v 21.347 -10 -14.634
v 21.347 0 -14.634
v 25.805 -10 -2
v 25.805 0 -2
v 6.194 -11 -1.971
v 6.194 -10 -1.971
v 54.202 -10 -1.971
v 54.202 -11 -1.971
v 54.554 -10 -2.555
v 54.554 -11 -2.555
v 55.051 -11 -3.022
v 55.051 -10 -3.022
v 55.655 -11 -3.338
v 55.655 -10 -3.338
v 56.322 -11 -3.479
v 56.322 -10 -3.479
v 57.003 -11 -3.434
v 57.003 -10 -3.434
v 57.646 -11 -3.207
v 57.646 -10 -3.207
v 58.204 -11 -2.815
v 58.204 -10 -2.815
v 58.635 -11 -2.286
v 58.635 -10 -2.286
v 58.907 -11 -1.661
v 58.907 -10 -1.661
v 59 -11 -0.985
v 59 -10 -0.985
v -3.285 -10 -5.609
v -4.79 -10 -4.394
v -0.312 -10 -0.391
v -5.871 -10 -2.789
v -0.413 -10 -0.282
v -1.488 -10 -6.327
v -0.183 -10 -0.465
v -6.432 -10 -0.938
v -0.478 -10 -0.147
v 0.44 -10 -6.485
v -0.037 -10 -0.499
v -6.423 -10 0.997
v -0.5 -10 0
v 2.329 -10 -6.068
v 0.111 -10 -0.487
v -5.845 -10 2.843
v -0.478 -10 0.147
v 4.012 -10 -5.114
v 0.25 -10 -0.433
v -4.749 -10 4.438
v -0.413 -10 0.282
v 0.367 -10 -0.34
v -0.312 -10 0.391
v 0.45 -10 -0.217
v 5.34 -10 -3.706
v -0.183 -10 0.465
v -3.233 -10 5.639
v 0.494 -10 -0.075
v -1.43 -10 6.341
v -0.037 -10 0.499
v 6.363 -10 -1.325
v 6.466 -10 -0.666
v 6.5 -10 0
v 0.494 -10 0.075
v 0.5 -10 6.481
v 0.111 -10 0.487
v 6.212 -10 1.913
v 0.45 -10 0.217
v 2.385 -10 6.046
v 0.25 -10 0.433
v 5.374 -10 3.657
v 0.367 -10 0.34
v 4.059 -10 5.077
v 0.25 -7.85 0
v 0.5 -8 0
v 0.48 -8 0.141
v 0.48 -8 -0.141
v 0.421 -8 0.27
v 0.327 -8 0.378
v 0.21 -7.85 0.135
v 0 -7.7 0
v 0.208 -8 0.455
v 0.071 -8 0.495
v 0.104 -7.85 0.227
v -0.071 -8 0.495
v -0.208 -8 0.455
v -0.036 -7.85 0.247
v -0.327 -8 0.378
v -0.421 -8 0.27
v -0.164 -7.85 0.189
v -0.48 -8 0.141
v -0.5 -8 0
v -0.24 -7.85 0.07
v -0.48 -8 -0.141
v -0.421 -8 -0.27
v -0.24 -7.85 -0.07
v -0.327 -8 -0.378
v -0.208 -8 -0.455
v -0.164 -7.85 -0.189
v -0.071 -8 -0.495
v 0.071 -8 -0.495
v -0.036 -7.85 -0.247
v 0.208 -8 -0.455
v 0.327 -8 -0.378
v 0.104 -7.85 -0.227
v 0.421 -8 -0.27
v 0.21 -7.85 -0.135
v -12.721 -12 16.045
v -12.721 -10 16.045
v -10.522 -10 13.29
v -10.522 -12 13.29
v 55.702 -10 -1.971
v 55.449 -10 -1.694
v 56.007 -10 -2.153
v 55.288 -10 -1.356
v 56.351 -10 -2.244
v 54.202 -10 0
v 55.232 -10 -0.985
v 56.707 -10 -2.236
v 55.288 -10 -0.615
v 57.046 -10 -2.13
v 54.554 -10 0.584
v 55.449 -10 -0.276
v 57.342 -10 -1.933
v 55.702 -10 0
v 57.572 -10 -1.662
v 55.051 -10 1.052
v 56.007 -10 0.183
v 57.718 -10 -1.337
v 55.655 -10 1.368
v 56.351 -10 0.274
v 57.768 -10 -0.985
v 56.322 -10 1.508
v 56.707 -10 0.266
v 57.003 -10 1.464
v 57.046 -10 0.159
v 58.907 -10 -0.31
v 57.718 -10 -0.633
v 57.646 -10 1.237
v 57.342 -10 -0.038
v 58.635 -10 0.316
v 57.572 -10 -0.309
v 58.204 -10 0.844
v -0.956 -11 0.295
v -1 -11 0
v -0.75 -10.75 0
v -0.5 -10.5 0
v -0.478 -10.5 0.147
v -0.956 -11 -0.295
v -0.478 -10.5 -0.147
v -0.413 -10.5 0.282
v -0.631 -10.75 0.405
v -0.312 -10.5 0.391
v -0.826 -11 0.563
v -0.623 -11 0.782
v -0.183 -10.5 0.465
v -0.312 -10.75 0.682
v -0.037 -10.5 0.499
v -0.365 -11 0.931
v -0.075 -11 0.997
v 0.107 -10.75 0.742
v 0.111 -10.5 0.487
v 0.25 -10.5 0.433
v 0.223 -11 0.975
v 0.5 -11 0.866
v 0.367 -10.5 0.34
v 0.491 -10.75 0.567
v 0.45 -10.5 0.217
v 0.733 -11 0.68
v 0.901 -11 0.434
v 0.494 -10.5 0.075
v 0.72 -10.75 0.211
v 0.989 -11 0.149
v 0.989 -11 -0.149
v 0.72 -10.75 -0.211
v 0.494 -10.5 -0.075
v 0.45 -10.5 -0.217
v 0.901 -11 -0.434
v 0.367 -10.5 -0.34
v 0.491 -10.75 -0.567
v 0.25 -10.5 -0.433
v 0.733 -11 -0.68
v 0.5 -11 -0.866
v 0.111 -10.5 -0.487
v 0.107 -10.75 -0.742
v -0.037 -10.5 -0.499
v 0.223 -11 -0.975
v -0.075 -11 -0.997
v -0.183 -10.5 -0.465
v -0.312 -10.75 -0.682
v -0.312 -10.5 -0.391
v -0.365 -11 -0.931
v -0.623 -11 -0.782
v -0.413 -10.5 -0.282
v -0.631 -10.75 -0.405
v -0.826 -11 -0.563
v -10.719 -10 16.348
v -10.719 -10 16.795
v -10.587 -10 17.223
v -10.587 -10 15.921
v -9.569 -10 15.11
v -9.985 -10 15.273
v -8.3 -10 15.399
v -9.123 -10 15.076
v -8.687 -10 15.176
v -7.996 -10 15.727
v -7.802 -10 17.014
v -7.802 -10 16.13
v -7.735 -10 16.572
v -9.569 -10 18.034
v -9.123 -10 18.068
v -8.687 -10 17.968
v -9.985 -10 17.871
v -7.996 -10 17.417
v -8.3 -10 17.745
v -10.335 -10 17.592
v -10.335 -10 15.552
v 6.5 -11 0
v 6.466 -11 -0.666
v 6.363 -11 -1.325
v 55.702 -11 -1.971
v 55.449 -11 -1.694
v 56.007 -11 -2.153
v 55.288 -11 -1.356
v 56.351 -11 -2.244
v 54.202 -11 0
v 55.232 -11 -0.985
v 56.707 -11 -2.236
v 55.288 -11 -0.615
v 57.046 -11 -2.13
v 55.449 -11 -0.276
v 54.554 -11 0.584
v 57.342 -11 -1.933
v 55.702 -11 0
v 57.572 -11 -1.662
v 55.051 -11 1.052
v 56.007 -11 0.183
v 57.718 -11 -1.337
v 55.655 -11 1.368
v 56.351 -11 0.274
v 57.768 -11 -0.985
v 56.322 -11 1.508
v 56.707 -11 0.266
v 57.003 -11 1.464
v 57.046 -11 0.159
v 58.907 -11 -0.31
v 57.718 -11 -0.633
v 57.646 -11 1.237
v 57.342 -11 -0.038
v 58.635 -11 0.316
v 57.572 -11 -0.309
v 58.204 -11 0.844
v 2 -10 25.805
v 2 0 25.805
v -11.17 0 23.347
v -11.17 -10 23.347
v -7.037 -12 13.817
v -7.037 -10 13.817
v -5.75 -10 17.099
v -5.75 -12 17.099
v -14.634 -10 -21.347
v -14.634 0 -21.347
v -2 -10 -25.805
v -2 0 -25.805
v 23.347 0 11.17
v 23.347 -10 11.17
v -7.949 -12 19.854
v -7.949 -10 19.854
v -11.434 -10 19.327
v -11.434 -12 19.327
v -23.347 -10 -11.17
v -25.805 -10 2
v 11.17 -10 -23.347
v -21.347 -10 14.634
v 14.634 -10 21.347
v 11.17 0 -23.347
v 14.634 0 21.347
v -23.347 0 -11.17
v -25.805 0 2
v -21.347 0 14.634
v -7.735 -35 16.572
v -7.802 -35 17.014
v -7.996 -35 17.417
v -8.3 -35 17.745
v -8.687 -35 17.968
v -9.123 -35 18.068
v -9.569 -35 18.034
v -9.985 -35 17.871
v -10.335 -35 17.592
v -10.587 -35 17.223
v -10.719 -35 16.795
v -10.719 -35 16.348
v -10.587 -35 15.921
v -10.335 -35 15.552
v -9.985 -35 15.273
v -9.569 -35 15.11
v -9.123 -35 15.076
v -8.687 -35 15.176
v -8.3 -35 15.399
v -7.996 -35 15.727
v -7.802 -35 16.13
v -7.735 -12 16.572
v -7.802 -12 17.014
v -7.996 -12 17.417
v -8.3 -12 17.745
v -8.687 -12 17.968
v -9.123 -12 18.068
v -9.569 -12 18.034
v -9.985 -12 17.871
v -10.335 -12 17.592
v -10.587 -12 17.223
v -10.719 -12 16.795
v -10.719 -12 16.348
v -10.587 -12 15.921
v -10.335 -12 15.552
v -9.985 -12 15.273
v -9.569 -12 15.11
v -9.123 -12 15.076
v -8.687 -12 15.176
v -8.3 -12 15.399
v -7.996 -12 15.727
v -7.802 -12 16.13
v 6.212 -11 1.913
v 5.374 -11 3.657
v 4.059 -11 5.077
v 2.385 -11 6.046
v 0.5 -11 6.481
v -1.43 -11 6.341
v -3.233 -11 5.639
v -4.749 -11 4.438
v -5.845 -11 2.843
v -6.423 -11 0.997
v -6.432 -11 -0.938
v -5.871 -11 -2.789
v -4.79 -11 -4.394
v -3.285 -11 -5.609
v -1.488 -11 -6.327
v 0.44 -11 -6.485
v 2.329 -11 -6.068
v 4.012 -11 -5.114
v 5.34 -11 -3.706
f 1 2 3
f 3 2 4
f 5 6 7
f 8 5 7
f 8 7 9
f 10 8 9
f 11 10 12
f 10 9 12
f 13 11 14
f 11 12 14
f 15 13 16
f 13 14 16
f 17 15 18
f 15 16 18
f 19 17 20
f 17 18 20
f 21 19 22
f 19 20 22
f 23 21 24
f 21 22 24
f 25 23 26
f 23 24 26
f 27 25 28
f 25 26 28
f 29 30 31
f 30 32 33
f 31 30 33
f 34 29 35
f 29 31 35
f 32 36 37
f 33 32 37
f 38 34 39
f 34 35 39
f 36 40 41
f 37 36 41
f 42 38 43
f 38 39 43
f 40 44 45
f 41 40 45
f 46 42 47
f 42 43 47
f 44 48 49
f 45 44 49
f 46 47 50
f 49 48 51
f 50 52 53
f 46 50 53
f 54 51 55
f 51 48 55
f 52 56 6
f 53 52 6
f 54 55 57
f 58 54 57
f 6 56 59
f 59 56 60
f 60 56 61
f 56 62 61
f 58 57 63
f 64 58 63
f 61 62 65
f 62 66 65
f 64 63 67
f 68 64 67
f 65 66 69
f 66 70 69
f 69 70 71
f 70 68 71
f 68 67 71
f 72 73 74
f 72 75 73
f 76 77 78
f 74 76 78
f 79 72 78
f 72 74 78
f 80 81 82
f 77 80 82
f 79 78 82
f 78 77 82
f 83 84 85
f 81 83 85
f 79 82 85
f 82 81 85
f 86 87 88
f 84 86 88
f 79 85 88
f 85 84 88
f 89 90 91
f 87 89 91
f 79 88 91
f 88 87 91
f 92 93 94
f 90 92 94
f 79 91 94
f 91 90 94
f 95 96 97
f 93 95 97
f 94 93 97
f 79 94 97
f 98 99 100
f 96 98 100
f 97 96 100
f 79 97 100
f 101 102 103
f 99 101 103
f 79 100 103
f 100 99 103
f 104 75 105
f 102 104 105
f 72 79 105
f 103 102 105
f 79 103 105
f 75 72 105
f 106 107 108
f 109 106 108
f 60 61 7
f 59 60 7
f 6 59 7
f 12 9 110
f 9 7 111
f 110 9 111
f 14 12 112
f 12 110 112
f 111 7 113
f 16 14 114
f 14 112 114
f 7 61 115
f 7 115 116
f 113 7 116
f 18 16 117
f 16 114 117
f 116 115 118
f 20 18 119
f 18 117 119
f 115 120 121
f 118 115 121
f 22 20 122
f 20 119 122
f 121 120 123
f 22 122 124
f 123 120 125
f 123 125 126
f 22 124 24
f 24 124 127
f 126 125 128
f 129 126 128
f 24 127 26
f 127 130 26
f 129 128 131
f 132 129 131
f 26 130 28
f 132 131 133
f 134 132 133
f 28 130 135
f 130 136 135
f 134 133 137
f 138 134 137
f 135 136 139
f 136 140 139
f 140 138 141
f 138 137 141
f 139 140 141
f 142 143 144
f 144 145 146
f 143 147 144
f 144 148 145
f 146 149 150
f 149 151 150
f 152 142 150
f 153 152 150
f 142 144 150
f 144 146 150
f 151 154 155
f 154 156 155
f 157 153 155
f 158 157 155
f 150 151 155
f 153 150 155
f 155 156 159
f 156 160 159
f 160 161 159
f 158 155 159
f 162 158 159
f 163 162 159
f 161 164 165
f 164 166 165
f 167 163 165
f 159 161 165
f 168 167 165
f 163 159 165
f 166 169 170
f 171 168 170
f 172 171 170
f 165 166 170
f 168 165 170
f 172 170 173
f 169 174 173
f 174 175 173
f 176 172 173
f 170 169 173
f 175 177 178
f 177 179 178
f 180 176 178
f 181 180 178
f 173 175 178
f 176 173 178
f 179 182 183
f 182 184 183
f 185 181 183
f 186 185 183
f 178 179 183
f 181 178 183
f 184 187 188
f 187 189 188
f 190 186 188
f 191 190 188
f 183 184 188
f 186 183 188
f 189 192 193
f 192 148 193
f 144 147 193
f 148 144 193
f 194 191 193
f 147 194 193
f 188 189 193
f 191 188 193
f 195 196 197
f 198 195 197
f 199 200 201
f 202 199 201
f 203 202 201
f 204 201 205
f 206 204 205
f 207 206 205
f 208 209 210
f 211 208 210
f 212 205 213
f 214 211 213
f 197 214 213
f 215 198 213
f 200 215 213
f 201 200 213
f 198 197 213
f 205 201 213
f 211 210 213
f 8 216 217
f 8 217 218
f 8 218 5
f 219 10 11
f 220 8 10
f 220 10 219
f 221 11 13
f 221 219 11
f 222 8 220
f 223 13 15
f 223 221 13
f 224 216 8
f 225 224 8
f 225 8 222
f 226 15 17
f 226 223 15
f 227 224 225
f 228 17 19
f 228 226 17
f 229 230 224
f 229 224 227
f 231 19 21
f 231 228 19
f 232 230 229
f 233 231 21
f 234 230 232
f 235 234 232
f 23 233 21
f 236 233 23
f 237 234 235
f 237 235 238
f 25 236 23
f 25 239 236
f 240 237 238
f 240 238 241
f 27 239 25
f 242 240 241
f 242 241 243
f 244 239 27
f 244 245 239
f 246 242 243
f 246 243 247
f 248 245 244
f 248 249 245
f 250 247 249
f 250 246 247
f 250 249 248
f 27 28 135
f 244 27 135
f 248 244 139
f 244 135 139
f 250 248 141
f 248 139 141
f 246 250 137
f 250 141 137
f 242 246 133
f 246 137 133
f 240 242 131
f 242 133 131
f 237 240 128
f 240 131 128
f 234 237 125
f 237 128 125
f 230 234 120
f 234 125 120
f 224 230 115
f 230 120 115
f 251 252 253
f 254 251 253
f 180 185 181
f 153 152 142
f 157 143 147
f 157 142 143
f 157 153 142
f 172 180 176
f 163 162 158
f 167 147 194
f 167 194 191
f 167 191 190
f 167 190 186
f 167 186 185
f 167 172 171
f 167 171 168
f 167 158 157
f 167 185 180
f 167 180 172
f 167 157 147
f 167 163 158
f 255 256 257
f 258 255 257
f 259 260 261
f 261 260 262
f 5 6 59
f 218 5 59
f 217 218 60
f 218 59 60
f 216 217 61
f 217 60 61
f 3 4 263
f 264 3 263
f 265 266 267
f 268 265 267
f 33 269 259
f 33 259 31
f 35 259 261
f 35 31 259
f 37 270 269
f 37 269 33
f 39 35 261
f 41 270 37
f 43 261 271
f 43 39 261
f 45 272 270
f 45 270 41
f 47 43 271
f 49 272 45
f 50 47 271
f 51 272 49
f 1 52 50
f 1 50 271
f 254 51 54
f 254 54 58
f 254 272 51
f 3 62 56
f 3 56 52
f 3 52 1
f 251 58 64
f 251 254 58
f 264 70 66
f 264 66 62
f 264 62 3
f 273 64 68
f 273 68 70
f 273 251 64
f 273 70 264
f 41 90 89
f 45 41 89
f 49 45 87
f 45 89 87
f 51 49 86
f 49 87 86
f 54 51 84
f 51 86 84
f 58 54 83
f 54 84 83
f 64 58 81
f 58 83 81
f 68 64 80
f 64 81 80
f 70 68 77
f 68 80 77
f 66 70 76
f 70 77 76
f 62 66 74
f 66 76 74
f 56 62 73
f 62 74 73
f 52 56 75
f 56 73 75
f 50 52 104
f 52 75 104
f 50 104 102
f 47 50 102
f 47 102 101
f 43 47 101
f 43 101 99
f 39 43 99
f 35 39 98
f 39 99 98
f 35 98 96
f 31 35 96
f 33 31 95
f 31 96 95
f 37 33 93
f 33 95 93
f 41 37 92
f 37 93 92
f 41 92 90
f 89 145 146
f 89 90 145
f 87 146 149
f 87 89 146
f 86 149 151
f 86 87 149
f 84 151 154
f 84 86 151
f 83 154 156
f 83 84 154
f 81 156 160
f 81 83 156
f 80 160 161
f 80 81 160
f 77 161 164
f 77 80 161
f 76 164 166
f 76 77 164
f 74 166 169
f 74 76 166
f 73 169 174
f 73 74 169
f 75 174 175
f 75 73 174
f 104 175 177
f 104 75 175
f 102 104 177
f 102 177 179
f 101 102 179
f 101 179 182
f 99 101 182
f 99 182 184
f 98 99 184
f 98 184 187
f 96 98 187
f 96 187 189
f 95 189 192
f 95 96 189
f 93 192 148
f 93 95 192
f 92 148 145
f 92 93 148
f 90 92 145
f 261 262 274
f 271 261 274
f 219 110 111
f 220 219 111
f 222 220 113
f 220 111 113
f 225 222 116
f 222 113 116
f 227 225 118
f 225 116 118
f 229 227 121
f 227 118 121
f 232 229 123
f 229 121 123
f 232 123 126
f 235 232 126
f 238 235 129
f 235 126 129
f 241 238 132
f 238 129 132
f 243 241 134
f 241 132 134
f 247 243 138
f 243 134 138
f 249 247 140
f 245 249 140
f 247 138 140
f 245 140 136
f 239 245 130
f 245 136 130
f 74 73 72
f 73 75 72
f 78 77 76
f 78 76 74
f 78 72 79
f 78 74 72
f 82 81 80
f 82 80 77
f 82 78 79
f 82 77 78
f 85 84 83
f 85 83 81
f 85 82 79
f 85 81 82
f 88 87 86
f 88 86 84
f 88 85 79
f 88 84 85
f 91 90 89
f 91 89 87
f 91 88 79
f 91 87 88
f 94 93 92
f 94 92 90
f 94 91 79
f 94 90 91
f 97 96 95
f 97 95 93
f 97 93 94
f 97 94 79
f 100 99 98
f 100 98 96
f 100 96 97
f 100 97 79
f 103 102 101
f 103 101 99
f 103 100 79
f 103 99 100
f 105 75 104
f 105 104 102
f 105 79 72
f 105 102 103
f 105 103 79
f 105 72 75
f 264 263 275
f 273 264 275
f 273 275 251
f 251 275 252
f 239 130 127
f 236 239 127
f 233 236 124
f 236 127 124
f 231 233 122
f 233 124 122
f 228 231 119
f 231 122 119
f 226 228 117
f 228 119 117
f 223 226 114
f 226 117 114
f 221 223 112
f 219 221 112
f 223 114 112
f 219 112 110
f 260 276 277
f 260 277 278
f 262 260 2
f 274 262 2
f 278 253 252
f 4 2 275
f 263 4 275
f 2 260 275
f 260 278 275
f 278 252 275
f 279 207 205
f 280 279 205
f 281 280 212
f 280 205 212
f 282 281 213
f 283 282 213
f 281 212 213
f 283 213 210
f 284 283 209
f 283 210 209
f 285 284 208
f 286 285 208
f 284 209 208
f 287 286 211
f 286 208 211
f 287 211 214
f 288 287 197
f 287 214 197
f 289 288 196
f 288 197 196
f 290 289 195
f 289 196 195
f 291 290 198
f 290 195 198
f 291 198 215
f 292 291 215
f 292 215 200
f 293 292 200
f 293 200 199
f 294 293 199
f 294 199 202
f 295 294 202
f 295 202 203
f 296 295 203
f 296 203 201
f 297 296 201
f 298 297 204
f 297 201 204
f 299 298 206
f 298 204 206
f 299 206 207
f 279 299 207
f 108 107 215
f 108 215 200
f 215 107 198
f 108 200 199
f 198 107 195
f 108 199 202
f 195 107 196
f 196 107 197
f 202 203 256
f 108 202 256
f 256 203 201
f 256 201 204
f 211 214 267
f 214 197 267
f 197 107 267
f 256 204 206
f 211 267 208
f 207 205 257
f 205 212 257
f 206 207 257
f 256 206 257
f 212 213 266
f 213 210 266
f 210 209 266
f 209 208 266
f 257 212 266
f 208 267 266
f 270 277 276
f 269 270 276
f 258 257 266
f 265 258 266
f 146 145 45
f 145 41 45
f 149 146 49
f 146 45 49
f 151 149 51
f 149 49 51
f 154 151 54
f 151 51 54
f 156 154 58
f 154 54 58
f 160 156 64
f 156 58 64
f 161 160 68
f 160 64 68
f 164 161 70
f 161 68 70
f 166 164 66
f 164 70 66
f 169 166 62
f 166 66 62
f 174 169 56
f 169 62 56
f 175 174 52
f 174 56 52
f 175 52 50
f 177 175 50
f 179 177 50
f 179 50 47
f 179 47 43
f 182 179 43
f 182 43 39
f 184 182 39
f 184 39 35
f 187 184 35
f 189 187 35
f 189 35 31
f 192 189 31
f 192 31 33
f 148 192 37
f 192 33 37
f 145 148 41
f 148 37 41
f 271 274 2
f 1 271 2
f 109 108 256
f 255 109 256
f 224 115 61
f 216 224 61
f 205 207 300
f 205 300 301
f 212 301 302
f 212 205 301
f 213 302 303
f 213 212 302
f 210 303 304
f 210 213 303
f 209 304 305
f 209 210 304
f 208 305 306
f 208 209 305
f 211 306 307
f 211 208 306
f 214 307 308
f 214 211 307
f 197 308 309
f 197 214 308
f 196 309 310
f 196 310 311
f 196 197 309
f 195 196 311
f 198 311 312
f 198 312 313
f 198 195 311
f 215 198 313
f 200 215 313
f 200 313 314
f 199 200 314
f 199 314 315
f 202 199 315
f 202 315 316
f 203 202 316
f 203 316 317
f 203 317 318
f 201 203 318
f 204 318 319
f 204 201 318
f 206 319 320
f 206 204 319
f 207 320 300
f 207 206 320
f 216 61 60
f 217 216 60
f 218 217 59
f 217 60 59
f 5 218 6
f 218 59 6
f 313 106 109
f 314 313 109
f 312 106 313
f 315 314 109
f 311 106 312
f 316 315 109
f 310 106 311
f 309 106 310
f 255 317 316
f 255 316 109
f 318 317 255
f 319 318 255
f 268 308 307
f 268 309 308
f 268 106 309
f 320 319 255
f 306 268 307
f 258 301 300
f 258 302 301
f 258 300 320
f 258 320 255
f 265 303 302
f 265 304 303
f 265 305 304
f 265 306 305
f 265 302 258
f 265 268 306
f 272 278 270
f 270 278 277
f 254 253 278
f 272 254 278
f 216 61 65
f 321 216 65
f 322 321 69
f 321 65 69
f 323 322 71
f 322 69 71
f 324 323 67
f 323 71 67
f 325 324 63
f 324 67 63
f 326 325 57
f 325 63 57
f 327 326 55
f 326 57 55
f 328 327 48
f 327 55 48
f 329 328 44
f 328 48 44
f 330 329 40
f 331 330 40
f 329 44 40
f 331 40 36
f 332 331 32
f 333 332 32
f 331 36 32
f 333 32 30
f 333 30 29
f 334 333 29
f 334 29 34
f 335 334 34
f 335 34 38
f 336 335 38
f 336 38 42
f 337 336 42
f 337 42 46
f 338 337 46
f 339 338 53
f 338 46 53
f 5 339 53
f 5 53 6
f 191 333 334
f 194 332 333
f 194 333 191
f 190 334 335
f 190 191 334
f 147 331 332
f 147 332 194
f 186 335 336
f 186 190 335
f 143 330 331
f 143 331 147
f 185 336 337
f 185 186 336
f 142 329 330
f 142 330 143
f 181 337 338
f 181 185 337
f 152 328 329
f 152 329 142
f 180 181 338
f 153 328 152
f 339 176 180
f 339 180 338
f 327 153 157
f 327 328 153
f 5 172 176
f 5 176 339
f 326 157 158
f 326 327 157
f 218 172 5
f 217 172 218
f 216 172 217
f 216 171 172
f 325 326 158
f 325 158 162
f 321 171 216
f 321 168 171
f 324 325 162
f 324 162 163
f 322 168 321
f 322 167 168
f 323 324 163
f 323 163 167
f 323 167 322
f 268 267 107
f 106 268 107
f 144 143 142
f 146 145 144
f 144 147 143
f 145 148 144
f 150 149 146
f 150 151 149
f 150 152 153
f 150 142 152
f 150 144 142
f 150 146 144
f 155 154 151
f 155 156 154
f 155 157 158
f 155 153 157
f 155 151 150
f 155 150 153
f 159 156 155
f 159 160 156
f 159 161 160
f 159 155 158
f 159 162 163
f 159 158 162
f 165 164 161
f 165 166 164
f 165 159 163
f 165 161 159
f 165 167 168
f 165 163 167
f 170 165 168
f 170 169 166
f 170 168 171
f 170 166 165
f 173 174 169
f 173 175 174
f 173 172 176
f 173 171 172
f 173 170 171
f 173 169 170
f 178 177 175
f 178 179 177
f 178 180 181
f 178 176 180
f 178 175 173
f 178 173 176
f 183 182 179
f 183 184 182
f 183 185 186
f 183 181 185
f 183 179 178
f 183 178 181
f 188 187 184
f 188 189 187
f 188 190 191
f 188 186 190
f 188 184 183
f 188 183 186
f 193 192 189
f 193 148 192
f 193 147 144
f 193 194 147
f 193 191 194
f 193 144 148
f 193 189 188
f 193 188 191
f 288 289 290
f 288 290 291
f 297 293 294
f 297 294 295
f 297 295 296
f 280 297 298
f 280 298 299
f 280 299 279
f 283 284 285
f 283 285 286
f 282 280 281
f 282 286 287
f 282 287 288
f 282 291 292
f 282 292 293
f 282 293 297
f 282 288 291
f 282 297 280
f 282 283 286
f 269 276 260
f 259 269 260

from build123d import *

# Parameters (mm, degrees)
F1_DEPTH         = 10
F3_DEPTH         = 1
F4_DEPTH         = 1
F6_D             = 1
F6_DEPTH         = 3
F6_CSINK_D       = 2
F6_CSINK_ANGLE   = 90
F6_TIP           = 0.3004303095
F6_2_D           = 1
F6_2_DEPTH       = 3
F6_2_CSINK_D     = 2
F6_2_CSINK_ANGLE = 90
F6_2_TIP         = 0.3004303095
F7_R             = 1
F8_DEPTH         = 11
F10_R            = 1.5
F11_DEPTH        = 25
F12_DEPTH        = 2


with BuildPart() as f1:
    # F0 (on Front) → F1 (new body)
    with BuildSketch(Plane.XZ):
        Polygon((-11.1702065635, 23.347365299), (-21.347365299, 14.6343081786), (-25.8045147421, 2), (-23.347365299, -11.1702065635), (-14.6343081786, -21.347365299), (-2, -25.8045147421), (11.1702065635, -23.347365299), (21.347365299, -14.6343081786), (25.8045147421, -2), (23.347365299, 11.1702065635), (14.6343081786, 21.347365299), (2, 25.8045147421), align=None)
    extrude(amount=F1_DEPTH)

    # F6
    with Locations(Plane.XZ.offset(11)):
        with Locations((0, 0)):
            CounterSinkHole(F6_D / 2, F6_CSINK_D / 2, depth=F6_DEPTH, counter_sink_angle=F6_CSINK_ANGLE)
            with Locations((0, 0, -(F6_DEPTH + F6_TIP / 2))):  # 118° drill point
                Cone(0, F6_D / 2, F6_TIP, mode=Mode.SUBTRACT)


with BuildPart() as f3:
    # F2 (on face) → F3 (new body)
    with BuildSketch(Plane.XZ.offset(10)):
        with BuildLine():
            ThreePointArc((6.1940788733, -1.9706310946), (6.423064404, -0.9971176769), (6.5, 0))
            ThreePointArc((6.5, 0), (-6.423064404, 0.9971176769), (6.1940788733, -1.9706310946))
        make_face()
    extrude(amount=F3_DEPTH)

    # F6#2
    with Locations(Plane.XZ.offset(11)):
        with Locations((0, 0)):
            CounterSinkHole(F6_2_D / 2, F6_2_CSINK_D / 2, depth=F6_2_DEPTH, counter_sink_angle=F6_2_CSINK_ANGLE)
            with Locations((0, 0, -(F6_2_DEPTH + F6_2_TIP / 2))):  # 118° drill point
                Cone(0, F6_2_D / 2, F6_2_TIP, mode=Mode.SUBTRACT)


with BuildPart() as f4:
    # F2 (on face) → F4 (new body)
    with BuildSketch(Plane.XZ.offset(10)):
        with BuildLine():
            Line((25.4313771712, 0), (6.5, 0))
            ThreePointArc((6.5, 0), (6.423064404, -0.9971176769), (6.1940788733, -1.9706310946))
            Line((6.1940788733, -1.9706310946), (25.7990354211, -1.9706310946))
            Line((25.7990354211, -1.9706310946), (25.4313771712, 0))
        make_face()
        with BuildLine():
            Line((54.2023591942, 0), (25.4313771712, 0))
            Line((25.4313771712, 0), (25.7990354211, -1.9706310946))
            Line((25.7990354211, -1.9706310946), (54.2023591942, -1.9706310946))
            ThreePointArc((54.2023591942, -1.9706310946), (54, -0.9853155473), (54.2023591942, 0))
        make_face()
        with BuildLine():
            ThreePointArc((59, -0.9853155473), (57.0029403472, 1.4635721609), (54.2023591942, 0))
            Line((54.2023591942, 0), (55.7021531952, 0))
            ThreePointArc((55.7021531952, 0), (57.0458332799, 0.1590062091), (57.767835262, -0.9853155473))
            ThreePointArc((57.767835262, -0.9853155473), (57.0458332799, -2.1296373037), (55.7021531952, -1.9706310946))
            Line((55.7021531952, -1.9706310946), (54.2023591942, -1.9706310946))
            ThreePointArc((54.2023591942, -1.9706310946), (57.0029403472, -3.4342032554), (59, -0.9853155473))
        make_face()
        with BuildLine():
            Line((55.7021531952, 0), (54.2023591942, 0))
            ThreePointArc((54.2023591942, 0), (54, -0.9853155473), (54.2023591942, -1.9706310946))
            Line((54.2023591942, -1.9706310946), (55.7021531952, -1.9706310946))
            ThreePointArc((55.7021531952, -1.9706310946), (55.232164738, -0.9853155473), (55.7021531952, 0))
        make_face()
    extrude(amount=F4_DEPTH)


with BuildPart() as f8:
    # F7 (on face) → F8 (new body, through all)
    with BuildSketch(Plane.XZ.offset(11)):
        Circle(F7_R)
    extrude(amount=-F8_DEPTH)

    # F9: cut F1, F3
    add(f1.part, mode=Mode.SUBTRACT)
    add(f3.part, mode=Mode.SUBTRACT)


with BuildPart() as f11:
    # F10 (on face) → F11 (new body)
    with BuildSketch(Plane.XZ.offset(10)):
        with Locations((-9.2354677618, 16.5719036013)):
            Circle(F10_R)
    extrude(amount=F11_DEPTH)


with BuildPart() as f12:
    # F10 (on face) → F12 (new body)
    with BuildSketch(Plane.XZ.offset(10)):
        Polygon((-7.0366399973, 13.8169999636), (-5.7502373443, 17.098692485), (-7.9490651088, 19.8535961227), (-11.4342955262, 19.326807239), (-12.7206981792, 16.0451147176), (-10.5218704147, 13.2902110799), align=None)
        with Locations((-9.2354677618, 16.5719036013)):
            Circle(F10_R, mode=Mode.SUBTRACT)
    extrude(amount=F12_DEPTH)


solid = Compound([f1.part, f3.part, f4.part, f8.part, f11.part, f12.part])
